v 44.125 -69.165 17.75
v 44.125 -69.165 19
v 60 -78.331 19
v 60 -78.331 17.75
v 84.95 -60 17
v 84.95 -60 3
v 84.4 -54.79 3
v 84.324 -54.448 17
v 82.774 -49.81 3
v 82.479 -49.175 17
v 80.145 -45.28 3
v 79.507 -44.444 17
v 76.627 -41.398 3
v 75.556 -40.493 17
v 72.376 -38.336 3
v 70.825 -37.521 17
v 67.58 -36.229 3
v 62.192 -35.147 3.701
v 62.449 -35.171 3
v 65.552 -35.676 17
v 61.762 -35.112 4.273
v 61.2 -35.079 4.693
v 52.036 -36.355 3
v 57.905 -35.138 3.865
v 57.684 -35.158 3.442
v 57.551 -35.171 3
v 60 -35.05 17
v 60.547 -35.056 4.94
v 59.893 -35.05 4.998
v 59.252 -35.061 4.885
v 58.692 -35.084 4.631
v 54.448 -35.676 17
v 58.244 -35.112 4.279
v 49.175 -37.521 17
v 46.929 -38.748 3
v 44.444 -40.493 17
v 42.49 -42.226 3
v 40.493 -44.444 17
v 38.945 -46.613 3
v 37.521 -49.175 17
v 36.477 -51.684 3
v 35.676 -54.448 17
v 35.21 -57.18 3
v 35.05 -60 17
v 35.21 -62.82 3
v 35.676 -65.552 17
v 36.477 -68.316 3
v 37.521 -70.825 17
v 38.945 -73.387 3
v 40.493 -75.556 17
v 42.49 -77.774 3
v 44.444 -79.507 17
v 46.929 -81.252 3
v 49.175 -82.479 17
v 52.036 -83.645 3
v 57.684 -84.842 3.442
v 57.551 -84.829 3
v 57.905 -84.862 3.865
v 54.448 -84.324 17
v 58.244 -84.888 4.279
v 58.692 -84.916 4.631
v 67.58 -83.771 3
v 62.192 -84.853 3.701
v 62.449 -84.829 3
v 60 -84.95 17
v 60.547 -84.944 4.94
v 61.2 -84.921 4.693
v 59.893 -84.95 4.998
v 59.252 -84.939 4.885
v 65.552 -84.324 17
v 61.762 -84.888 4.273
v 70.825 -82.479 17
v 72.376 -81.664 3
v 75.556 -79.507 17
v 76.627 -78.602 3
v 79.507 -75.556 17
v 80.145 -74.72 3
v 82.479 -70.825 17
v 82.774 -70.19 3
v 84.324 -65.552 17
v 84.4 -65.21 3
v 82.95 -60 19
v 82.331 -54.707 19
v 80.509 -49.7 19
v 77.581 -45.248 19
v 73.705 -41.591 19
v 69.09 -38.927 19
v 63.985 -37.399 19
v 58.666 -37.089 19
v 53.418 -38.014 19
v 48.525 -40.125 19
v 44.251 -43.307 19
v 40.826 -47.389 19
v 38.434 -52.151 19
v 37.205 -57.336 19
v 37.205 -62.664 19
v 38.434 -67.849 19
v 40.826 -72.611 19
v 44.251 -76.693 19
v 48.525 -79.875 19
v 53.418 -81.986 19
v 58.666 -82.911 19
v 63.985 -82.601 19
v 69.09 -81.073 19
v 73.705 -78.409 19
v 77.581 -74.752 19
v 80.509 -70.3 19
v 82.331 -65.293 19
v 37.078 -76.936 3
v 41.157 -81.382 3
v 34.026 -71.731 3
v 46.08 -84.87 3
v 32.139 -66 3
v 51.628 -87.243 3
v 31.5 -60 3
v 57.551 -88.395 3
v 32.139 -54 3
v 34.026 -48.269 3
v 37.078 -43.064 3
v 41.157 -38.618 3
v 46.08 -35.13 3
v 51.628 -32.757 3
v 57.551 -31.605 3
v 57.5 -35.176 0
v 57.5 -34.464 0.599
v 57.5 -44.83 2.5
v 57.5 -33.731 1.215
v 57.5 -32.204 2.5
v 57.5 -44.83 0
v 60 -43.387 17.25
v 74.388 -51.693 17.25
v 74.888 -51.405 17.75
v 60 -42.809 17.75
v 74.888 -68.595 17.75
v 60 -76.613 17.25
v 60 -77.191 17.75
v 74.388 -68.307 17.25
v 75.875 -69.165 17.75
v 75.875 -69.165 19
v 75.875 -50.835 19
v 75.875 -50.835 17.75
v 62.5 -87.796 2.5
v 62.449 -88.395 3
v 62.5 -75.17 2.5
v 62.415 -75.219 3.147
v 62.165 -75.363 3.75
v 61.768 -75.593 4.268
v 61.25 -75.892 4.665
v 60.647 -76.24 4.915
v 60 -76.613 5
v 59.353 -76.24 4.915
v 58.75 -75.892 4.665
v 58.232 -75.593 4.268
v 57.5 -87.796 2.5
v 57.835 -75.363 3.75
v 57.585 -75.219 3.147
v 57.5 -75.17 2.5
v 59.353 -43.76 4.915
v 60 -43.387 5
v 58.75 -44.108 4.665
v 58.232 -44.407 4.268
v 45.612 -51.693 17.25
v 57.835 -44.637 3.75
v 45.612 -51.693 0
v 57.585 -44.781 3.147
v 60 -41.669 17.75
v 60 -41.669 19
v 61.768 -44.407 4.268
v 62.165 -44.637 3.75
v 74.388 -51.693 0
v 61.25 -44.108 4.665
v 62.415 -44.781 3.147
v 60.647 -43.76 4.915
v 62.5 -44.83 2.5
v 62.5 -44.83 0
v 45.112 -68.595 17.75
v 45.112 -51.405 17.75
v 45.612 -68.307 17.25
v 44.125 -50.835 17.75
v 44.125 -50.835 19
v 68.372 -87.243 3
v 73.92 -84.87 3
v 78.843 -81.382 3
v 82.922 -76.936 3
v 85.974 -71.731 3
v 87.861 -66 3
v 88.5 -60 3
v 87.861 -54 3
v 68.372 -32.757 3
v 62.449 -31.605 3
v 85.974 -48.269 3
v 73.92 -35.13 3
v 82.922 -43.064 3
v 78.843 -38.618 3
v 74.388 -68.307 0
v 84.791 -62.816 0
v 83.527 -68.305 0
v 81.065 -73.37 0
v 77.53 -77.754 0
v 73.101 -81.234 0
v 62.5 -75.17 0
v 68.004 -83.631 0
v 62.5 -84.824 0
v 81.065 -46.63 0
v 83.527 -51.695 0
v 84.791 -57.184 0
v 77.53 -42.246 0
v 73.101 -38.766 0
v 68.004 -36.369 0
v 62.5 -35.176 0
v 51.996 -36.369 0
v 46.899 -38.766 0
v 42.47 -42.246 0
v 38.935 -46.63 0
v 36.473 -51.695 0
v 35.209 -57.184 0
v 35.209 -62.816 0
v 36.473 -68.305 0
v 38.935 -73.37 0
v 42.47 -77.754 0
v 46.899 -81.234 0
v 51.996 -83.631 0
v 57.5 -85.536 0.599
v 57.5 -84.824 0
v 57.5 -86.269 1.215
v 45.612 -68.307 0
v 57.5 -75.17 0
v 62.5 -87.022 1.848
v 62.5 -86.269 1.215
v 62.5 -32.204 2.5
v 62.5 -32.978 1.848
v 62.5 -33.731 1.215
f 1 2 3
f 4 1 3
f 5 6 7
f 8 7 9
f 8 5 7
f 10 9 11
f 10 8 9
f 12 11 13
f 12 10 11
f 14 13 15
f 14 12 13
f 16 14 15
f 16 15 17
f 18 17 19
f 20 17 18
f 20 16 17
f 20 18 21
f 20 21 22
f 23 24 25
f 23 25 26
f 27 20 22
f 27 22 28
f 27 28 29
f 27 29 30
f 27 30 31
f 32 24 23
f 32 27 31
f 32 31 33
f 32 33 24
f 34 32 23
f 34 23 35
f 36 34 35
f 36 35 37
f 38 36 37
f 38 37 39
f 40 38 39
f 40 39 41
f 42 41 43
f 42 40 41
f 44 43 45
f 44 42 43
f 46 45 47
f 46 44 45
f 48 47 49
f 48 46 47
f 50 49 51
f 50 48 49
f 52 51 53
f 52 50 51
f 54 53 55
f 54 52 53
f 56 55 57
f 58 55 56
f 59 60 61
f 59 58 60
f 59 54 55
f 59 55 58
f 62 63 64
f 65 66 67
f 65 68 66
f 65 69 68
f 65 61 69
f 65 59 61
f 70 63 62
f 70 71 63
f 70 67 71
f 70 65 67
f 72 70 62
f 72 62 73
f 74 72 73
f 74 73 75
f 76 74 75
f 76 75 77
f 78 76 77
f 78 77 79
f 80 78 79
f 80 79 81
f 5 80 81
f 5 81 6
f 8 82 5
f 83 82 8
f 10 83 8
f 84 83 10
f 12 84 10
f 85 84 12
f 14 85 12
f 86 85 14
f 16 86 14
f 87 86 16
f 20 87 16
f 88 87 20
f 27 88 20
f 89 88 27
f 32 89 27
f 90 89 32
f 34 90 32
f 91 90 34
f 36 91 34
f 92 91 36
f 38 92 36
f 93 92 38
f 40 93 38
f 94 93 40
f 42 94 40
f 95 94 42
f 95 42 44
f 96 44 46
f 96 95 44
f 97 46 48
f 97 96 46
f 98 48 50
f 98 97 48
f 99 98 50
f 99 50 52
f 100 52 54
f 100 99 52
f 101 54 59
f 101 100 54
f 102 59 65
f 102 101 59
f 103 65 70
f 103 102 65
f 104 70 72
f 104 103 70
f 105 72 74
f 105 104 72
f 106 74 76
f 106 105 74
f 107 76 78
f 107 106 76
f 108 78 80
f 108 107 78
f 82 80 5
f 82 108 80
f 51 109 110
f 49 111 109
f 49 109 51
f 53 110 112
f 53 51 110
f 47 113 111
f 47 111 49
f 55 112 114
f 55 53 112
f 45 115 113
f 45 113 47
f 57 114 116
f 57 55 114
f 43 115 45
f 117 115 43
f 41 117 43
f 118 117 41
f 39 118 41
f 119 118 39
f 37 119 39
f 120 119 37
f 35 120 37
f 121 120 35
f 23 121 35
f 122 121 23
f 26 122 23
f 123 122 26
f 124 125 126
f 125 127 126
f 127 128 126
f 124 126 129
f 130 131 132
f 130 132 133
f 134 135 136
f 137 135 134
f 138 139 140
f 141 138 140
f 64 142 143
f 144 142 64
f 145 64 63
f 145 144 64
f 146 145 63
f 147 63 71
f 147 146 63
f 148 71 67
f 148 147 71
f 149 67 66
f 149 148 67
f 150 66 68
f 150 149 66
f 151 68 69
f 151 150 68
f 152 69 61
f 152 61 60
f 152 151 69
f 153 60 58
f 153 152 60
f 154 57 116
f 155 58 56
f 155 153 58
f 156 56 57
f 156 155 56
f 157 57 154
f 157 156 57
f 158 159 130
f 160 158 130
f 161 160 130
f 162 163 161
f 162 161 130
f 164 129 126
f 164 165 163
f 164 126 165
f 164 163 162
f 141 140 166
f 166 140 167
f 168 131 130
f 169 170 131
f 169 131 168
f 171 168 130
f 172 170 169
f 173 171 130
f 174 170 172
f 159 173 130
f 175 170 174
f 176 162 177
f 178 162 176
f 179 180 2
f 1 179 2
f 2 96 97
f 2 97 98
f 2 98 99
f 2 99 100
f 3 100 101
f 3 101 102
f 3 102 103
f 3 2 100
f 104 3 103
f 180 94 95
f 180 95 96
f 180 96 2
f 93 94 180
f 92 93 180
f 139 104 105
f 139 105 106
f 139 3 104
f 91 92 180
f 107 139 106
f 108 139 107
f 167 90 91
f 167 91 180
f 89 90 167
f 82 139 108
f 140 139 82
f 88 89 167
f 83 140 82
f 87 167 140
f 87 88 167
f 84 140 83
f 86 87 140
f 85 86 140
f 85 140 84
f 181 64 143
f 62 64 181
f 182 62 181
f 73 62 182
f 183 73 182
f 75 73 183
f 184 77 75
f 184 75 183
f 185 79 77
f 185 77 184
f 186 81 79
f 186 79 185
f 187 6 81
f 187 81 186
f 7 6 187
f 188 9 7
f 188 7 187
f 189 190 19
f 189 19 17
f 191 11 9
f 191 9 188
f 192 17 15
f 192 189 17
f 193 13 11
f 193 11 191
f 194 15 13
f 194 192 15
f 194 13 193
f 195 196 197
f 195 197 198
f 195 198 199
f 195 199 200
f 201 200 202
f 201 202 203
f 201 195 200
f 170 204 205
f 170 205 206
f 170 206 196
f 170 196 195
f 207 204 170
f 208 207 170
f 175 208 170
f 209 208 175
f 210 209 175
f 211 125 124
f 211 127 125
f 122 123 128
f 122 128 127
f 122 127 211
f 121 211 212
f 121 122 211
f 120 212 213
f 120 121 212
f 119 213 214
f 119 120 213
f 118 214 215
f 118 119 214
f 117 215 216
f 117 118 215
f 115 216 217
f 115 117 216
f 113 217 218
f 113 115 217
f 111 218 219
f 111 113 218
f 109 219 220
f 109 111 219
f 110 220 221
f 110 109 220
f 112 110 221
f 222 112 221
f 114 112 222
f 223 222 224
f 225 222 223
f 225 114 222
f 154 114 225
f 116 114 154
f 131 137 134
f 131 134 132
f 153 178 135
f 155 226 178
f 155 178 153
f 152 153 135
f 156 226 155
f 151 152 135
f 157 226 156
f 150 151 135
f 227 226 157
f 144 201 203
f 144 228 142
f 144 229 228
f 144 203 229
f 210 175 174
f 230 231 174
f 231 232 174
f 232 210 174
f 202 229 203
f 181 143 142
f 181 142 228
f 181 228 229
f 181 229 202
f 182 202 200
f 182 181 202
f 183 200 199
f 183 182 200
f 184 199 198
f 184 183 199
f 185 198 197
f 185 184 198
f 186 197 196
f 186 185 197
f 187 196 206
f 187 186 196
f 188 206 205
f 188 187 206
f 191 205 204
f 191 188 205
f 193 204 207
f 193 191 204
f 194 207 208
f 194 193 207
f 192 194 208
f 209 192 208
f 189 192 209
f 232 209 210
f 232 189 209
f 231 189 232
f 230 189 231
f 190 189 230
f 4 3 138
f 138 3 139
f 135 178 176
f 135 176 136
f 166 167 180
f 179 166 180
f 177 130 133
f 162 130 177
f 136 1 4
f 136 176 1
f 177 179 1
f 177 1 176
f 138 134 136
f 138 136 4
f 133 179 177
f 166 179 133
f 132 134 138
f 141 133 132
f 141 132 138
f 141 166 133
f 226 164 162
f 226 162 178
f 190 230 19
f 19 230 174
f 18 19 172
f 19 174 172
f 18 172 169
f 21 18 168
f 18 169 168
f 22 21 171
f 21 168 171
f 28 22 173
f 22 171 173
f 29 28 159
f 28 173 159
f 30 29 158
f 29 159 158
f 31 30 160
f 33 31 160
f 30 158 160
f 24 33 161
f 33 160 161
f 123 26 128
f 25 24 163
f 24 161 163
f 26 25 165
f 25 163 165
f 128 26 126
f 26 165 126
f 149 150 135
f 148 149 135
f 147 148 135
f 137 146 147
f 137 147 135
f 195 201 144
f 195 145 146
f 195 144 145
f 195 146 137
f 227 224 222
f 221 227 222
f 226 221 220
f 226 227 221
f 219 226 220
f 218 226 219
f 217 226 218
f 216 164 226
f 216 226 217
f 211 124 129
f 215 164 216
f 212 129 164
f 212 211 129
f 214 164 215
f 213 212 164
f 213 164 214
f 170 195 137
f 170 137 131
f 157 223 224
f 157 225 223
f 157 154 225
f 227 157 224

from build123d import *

# Parameters (mm, degrees)
POCKET025_DEPTH      = 19.001
POCKET026_DEPTH      = 1.25
CHAMFER002_SIZE      = 2
CHAMFER003_SIZE      = 0.5
POCKET027_DEPTH      = 28.501
POCKET027_DEPTH_BACK = 28.501


with BuildPart() as part:
    # Sketch035 (on XZ_Plane051 of Origin104) → Revolution011 (revolve)
    with BuildSketch(Plane.XZ):
        Polygon((0, 0), (24.95, 0), (28.5, 3), (24.95, 3), (24.95, 19), (0, 19), align=None)
    revolve(axis=Axis((0, 0, 0), (0, 0, 1)))

    # Sketch036 (on XY_Plane051 of Origin104) → Pocket025 (cut, through all)
    with BuildSketch(Plane.XY):
        Polygon((14.3875, 8.306627), (0, 16.613254), (-14.3875, 8.306627), (-14.3875, -8.306627), (0, -16.613254), (14.3875, -8.306627), align=None)
    extrude(amount=POCKET025_DEPTH, mode=Mode.SUBTRACT)

    # Sketch037 (on XY_Plane051 of Origin104) → Pocket026 (cut)
    with BuildSketch(Plane.XY.offset(19)):
        Polygon((15.875, -9.165436), (15.875, 9.165436), (0, 18.330871), (-15.875, 9.165436), (-15.875, -9.165436), (0, -18.330871), align=None)
    extrude(amount=-POCKET026_DEPTH, mode=Mode.SUBTRACT)

    # Chamfer002
    chamfer002_edges = [part.edges().sort_by_distance(p)[0] for p in [
        (-24.95, 0, 19),
    ]]
    chamfer(chamfer002_edges, length=CHAMFER002_SIZE)

    # Chamfer003
    chamfer003_edges = [part.edges().sort_by_distance(p)[0] for p in [
        (-14.3875, 0, 17.75),
        (-7.19375, 12.45994, 17.75),
        (7.19375, 12.45994, 17.75),
        (14.3875, 0, 17.75),
        (7.19375, -12.45994, 17.75),
        (-7.19375, -12.45994, 17.75),
    ]]
    chamfer(chamfer003_edges, length=CHAMFER003_SIZE)

    # Sketch038 (on XZ_Plane052 of Origin104) → Pocket027 (cut, two sides)
    with BuildSketch(Plane.XZ) as pocket027_sk:
        with BuildLine():
            ThreePointArc((2.5, 2.5), (0, 5), (-2.5, 2.5))
            Line((-2.5, 2.5), (-2.5, -2.5))
            Line((-2.5, -2.5), (2.5, -2.5))
            Line((2.5, -2.5), (2.5, 2.5))
        make_face()
    extrude(amount=-POCKET027_DEPTH, mode=Mode.SUBTRACT)
    extrude(pocket027_sk.sketch, amount=POCKET027_DEPTH_BACK, mode=Mode.SUBTRACT)


with BuildPart() as part_1:
    # Body056 placement: moved
    add(part.part.moved(Location((60, -60, 0))))


solid = part_1.part
